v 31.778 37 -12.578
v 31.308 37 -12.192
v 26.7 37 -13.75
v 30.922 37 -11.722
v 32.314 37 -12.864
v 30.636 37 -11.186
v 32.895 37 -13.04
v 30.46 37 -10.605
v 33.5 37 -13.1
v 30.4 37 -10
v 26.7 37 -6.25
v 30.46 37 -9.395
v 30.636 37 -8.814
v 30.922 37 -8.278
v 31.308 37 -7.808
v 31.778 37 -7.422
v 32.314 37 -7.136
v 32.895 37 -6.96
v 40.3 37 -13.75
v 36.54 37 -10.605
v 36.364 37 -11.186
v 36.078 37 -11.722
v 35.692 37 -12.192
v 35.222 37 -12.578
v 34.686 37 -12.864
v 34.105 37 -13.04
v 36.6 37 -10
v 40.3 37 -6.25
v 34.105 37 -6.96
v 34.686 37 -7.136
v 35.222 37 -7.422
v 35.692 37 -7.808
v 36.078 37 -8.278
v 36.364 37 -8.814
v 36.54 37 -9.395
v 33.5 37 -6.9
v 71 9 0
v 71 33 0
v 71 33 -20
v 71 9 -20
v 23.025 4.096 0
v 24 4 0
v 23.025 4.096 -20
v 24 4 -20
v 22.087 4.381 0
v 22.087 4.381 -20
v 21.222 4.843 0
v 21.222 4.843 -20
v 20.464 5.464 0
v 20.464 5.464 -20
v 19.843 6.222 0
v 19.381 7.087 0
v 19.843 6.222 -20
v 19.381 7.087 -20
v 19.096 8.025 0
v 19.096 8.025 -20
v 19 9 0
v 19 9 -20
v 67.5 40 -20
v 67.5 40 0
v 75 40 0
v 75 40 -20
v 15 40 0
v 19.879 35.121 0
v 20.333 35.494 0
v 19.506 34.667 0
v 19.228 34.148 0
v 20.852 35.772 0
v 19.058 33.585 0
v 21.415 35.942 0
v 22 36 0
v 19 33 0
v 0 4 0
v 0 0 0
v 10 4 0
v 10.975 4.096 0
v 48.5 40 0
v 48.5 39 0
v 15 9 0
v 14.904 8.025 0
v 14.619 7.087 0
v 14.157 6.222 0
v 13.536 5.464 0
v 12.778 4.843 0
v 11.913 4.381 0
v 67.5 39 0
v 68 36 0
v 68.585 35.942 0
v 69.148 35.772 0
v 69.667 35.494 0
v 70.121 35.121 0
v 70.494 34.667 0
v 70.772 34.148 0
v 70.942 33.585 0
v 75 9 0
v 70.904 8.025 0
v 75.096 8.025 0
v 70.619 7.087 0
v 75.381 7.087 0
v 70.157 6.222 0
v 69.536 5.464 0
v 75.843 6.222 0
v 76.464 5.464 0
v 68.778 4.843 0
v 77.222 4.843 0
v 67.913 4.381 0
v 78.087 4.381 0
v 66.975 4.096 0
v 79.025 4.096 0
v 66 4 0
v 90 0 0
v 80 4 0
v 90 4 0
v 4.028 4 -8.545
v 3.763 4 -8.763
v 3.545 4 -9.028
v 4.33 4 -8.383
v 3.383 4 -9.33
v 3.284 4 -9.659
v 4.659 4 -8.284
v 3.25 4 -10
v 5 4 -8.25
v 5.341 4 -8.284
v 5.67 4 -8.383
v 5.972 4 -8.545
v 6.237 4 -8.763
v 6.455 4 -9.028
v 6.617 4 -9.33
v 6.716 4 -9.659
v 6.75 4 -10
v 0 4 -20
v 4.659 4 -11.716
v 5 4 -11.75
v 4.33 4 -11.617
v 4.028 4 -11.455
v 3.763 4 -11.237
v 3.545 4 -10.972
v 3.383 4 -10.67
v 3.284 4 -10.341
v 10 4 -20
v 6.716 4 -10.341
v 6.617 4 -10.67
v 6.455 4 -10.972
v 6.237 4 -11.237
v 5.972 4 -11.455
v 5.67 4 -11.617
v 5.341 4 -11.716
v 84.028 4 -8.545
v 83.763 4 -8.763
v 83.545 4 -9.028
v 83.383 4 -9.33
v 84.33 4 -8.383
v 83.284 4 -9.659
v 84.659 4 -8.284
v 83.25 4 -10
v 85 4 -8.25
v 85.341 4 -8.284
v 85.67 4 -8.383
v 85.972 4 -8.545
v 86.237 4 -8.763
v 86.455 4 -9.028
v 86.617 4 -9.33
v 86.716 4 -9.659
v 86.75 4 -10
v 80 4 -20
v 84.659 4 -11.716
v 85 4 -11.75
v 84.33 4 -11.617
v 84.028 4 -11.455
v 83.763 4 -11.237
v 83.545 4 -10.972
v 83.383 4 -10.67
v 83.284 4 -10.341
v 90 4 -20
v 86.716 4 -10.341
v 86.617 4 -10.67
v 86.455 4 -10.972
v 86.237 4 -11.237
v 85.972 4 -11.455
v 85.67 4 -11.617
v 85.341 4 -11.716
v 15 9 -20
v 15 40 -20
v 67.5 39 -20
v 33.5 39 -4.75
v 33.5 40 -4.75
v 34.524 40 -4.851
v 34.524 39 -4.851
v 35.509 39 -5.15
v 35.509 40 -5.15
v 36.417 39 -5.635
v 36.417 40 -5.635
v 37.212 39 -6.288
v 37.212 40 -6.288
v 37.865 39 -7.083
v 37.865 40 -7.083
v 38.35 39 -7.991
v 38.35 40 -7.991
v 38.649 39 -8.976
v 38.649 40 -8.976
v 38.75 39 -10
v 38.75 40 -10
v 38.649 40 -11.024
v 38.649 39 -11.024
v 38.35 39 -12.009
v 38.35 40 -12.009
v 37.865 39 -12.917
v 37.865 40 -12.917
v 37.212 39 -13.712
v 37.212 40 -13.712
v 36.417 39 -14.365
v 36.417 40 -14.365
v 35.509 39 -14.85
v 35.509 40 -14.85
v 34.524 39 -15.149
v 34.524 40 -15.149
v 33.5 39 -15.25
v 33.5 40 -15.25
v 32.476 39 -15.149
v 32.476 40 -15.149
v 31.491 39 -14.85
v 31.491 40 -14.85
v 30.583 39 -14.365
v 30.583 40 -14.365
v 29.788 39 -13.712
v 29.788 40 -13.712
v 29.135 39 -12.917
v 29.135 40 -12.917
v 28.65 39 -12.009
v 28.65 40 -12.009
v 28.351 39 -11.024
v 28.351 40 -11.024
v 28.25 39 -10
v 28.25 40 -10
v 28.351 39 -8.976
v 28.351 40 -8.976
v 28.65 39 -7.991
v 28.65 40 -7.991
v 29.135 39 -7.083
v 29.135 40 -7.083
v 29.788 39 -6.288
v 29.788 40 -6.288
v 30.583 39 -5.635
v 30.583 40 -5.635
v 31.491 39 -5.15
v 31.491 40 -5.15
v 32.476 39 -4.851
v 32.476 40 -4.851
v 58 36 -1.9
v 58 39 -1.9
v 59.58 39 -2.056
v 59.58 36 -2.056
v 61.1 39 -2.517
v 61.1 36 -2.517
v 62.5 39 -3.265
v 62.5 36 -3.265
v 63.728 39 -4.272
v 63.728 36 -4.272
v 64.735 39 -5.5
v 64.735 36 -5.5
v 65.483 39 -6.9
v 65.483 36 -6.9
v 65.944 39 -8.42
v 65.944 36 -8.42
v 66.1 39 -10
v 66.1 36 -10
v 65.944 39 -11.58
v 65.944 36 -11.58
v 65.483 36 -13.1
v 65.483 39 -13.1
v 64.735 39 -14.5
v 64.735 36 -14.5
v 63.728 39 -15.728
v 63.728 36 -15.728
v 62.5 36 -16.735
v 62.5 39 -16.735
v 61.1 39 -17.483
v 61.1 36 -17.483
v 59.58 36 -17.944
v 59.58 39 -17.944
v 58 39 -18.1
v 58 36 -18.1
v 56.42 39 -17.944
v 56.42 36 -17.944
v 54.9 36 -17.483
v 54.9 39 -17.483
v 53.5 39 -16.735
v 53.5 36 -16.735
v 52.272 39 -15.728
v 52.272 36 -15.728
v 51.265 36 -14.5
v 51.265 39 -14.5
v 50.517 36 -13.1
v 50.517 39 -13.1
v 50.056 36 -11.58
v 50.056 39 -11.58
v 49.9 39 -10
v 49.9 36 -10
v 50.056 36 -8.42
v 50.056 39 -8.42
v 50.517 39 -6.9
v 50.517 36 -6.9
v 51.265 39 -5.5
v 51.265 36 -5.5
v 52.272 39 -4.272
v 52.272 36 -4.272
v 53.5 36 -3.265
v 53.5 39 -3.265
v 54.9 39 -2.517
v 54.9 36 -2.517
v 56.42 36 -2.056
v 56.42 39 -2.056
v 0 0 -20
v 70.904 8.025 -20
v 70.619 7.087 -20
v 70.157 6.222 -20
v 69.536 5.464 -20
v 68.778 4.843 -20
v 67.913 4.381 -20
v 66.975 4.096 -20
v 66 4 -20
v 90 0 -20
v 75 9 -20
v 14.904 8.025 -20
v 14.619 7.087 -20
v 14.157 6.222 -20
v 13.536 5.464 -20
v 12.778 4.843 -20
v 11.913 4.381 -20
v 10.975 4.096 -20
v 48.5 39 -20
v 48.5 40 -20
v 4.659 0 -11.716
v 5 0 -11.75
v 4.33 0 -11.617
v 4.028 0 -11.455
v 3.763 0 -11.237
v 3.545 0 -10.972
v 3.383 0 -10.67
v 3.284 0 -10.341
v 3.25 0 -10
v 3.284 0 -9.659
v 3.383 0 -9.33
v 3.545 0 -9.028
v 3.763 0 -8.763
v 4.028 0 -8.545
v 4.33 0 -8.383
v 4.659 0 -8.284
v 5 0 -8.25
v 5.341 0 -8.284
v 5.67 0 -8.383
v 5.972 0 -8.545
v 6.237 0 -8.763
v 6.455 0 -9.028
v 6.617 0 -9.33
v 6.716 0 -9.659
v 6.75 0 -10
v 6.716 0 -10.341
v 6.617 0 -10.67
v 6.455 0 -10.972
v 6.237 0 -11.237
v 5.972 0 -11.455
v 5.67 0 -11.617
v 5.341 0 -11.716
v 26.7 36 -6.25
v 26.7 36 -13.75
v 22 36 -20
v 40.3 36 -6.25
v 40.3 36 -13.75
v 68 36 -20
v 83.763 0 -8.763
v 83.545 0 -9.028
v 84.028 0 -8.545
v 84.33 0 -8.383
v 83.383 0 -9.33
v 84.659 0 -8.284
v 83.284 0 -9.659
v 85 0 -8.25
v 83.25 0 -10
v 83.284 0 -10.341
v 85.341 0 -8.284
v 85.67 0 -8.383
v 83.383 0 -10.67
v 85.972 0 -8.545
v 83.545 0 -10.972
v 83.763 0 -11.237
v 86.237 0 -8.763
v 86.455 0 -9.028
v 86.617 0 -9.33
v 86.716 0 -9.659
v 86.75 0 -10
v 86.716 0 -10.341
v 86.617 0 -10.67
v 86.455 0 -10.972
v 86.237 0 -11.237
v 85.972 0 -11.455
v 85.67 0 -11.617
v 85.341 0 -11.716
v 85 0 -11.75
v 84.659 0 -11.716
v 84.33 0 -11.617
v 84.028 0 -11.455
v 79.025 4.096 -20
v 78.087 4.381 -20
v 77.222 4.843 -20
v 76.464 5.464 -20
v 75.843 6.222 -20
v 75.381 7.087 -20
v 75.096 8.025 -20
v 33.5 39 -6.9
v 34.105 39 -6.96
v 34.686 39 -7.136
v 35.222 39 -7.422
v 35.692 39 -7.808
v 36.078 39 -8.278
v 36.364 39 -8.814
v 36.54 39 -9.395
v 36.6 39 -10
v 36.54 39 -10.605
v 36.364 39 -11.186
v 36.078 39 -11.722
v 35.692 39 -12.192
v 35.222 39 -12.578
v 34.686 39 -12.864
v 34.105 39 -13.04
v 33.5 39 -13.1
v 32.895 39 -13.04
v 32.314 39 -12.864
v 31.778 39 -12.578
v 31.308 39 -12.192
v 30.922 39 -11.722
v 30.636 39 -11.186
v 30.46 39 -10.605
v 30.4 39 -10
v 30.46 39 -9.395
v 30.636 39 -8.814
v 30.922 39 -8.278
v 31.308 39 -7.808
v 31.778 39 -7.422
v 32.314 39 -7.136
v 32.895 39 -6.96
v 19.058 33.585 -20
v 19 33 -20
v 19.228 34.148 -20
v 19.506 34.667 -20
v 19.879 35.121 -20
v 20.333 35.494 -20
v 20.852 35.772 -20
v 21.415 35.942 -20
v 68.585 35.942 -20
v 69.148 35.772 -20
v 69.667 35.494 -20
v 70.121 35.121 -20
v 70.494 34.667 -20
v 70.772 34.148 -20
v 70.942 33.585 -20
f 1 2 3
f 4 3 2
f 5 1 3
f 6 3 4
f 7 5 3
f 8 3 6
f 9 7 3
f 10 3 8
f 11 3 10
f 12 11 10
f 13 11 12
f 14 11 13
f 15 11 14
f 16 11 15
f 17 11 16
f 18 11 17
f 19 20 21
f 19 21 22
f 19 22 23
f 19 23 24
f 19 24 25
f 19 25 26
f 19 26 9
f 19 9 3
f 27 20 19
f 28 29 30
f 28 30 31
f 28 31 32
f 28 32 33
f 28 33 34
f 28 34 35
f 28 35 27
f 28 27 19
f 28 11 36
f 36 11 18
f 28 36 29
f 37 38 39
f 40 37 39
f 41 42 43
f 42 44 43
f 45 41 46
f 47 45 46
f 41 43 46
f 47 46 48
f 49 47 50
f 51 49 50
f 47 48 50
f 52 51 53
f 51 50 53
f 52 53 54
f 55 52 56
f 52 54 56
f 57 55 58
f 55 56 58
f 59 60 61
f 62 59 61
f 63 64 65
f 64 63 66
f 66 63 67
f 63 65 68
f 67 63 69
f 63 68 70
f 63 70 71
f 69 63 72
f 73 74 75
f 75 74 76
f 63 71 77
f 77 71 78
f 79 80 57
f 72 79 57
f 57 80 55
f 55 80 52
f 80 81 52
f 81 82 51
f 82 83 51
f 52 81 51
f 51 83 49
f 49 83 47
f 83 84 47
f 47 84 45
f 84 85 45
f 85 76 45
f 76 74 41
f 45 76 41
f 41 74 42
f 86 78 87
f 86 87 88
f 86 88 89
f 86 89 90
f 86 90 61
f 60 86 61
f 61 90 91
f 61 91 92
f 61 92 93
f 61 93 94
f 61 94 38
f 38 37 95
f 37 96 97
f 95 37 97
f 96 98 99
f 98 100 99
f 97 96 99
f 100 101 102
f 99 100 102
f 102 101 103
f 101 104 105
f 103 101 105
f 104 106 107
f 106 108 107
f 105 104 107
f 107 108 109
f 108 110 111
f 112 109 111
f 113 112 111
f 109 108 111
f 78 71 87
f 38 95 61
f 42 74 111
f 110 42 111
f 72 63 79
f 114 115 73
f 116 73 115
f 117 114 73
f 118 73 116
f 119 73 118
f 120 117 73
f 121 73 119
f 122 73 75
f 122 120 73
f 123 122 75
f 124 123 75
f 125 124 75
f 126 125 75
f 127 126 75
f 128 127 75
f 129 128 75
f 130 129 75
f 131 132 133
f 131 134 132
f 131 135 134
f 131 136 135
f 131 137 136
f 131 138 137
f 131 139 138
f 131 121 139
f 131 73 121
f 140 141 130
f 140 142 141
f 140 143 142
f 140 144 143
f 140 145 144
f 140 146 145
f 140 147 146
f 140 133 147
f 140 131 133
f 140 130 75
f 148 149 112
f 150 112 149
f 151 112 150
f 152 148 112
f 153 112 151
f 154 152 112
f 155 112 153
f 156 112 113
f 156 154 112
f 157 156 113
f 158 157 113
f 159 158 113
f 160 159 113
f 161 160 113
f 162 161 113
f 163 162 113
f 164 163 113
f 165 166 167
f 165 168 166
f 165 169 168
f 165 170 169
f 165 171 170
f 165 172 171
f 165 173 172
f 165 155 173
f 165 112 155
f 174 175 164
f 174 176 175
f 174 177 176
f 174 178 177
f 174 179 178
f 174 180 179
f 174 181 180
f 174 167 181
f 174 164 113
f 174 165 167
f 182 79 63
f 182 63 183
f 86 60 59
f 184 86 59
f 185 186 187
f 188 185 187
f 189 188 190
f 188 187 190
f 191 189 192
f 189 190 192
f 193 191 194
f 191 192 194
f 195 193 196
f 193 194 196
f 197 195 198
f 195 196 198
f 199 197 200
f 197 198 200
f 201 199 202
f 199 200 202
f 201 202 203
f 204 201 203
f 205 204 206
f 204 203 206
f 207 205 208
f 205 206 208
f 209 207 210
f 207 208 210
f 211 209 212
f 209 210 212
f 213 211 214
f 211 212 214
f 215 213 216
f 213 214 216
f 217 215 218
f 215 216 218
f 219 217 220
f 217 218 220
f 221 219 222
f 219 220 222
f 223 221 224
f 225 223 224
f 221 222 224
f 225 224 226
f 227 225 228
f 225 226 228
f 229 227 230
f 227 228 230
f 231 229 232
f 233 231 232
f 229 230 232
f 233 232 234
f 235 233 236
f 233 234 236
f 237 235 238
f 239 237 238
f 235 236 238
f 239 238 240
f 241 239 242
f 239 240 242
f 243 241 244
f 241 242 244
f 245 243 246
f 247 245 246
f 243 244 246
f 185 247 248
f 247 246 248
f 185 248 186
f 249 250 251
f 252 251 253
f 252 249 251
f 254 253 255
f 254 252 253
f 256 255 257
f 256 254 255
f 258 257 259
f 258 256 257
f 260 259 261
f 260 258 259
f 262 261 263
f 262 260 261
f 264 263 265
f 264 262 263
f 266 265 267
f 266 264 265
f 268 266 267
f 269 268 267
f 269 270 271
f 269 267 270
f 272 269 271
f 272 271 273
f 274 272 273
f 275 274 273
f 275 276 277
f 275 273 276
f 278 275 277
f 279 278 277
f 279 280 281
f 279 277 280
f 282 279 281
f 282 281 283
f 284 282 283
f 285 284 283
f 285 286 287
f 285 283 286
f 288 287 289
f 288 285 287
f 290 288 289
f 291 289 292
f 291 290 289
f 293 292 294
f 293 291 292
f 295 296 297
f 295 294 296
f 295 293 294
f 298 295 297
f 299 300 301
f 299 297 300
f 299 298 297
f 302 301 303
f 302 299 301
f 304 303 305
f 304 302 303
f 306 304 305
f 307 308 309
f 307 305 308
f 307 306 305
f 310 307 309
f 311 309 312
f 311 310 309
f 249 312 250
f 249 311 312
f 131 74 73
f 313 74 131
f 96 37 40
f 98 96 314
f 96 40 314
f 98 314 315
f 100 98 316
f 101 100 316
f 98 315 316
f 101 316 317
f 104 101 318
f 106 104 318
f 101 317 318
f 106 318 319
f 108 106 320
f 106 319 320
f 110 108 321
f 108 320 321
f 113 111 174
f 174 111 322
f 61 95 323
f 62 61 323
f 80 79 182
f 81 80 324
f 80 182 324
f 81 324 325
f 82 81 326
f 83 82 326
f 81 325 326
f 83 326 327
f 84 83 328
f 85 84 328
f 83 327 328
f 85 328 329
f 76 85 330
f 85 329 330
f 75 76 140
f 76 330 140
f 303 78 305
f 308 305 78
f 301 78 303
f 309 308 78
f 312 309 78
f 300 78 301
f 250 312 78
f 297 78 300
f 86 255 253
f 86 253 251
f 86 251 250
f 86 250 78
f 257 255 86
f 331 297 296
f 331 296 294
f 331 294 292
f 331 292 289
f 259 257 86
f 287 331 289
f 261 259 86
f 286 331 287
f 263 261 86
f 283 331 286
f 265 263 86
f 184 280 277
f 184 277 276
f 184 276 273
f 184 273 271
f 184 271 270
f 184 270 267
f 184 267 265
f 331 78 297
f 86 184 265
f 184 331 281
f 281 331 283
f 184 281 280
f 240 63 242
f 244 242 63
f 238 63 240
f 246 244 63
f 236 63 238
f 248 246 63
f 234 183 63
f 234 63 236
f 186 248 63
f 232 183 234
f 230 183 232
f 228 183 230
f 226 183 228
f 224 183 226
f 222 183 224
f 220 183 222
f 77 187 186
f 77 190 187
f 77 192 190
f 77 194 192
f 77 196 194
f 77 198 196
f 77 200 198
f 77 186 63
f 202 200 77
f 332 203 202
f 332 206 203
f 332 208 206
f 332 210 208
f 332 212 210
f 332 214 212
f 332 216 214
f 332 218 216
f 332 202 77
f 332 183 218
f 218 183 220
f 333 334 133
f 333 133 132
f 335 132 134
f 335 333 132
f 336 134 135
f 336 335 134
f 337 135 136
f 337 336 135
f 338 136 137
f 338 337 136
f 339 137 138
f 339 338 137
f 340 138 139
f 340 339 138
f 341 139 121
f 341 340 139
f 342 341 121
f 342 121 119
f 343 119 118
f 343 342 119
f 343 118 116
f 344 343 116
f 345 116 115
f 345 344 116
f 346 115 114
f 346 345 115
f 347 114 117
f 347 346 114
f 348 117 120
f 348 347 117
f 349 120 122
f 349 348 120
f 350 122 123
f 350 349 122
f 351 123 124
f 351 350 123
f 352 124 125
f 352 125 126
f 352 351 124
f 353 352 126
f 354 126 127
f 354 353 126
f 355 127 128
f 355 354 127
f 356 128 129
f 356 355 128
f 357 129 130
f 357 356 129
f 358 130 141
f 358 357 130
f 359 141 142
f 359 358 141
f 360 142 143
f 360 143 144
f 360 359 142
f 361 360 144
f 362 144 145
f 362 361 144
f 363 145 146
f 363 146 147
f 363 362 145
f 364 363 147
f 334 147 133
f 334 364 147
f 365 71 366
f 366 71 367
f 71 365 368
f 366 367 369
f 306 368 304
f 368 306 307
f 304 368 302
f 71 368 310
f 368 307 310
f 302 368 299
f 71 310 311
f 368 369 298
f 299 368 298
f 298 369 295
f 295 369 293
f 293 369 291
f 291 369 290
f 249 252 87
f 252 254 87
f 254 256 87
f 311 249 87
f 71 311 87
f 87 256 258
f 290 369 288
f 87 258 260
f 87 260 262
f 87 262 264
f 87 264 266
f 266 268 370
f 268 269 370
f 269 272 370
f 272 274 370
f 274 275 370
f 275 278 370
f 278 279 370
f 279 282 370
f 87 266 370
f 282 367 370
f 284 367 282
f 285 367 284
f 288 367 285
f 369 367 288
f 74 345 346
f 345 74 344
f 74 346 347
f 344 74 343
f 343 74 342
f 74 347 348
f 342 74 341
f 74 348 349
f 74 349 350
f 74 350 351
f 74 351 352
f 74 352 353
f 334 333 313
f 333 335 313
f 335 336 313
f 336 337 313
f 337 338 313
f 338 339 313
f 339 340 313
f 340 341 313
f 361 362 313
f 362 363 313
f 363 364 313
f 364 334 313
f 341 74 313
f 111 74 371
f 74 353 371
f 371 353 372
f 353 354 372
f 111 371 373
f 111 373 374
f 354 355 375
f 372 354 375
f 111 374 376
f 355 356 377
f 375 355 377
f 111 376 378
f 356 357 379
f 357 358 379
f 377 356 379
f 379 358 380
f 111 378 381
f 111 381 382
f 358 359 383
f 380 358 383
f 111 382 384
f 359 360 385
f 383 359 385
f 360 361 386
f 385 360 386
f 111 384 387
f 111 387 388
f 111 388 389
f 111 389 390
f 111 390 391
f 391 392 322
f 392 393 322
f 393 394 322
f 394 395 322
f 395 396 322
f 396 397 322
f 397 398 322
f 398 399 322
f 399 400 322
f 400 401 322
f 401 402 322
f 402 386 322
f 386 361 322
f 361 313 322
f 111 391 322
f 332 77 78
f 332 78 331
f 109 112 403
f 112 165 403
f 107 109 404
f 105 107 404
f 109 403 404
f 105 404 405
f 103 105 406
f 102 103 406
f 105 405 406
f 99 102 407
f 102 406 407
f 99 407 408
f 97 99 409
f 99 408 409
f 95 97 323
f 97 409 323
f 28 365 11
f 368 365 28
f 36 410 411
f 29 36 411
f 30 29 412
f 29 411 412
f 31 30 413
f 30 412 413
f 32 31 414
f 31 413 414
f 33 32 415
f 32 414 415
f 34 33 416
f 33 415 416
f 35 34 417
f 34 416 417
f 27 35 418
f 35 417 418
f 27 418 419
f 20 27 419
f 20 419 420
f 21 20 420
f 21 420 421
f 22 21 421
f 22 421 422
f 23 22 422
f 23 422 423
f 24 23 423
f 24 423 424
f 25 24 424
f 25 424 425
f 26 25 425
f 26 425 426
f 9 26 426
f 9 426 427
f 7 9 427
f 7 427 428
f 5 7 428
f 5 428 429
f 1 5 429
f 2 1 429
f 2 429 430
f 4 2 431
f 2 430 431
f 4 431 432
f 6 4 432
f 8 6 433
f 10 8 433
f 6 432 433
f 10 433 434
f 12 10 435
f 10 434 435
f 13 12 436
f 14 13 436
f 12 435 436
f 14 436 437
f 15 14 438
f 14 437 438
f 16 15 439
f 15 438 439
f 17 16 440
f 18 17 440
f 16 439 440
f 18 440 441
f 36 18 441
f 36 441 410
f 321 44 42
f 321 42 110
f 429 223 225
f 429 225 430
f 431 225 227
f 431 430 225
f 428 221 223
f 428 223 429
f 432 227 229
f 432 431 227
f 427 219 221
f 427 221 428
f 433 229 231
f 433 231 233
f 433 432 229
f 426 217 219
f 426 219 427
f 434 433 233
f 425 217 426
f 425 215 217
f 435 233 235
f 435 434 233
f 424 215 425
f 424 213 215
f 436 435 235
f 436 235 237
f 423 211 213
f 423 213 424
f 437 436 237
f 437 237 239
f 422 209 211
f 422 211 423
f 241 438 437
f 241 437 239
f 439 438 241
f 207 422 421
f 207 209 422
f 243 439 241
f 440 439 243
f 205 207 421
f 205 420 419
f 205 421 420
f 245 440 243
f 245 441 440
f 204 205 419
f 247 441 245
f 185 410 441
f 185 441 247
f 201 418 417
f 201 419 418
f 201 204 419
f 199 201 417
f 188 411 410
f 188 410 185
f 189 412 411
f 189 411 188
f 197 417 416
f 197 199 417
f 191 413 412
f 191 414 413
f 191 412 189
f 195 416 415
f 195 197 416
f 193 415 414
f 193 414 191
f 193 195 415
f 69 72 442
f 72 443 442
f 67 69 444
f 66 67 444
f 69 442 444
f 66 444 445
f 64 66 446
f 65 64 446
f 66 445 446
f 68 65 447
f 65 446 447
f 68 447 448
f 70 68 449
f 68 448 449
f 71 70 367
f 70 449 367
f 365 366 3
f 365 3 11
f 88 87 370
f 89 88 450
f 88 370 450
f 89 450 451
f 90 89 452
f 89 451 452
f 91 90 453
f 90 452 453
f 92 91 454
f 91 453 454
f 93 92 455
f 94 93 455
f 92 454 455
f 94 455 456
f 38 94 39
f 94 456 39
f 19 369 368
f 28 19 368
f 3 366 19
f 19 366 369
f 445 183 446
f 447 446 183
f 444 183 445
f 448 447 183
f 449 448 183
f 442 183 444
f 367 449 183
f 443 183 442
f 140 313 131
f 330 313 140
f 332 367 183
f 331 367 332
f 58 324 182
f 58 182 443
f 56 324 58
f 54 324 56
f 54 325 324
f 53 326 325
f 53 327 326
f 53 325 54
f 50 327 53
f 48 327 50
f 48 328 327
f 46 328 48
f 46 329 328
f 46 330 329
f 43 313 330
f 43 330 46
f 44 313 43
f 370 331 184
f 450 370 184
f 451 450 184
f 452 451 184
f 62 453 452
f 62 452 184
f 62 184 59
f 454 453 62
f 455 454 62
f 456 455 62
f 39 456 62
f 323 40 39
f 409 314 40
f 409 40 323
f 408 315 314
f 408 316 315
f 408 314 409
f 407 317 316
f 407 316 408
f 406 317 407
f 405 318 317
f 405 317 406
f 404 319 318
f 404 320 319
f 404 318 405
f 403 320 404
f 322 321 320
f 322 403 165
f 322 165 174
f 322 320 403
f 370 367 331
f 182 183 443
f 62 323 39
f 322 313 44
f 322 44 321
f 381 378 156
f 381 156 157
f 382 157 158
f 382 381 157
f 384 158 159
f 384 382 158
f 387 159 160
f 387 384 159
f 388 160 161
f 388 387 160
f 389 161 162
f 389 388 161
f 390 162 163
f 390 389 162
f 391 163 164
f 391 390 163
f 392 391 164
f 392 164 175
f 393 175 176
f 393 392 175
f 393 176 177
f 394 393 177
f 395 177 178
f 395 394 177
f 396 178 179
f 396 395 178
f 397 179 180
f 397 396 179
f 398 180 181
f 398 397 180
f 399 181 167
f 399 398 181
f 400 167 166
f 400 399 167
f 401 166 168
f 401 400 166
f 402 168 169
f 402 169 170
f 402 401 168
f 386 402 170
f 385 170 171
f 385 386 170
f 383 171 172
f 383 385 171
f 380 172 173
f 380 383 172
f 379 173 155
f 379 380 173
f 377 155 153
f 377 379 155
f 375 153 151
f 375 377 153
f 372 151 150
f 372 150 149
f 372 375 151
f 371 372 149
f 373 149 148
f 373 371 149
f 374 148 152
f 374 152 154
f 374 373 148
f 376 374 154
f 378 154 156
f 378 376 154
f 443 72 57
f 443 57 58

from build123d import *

# Parameters (mm, degrees)
SKETCH_1_W          = 90
SKETCH_1_H          = 20
SKETCH_1_R          = 1.75
EXTRUDE_1_DEPTH     = 4
SKETCH_2_W          = 4
SKETCH_2_H          = 20
EXTRUDE_2_DEPTH     = 32
SKETCH_3_W          = 60
SKETCH_3_H          = 20
SKETCH_3_R          = 8.1
EXTRUDE_3_DEPTH     = 4
FILLET_1_R          = 5
FILLET_2_R          = 3
SKETCH_4_W          = 19
SKETCH_4_H          = 20
CUT_EXTRUDE_1_DEPTH = 1
SKETCH_5_R          = 3.1
CUT_EXTRUDE_2_DEPTH = 10
SKETCH_6_W          = 13.6
SKETCH_6_H          = 7.5
CUT_EXTRUDE_3_DEPTH = 1
SKETCH_7_R          = 5.25
CUT_EXTRUDE_4_DEPTH = 1


with BuildPart() as part:
    # 草图1 → 凸台-拉伸1 (new body)
    with BuildSketch(Plane(origin=(0, 0, 0), x_dir=(1, 0, 0), z_dir=(0, 1, 0))):
        with Locations((45, 10)):
            Rectangle(SKETCH_1_W, SKETCH_1_H)
        with Locations(Location((85, 10, 0), (0, 0, 270))):
            Circle(SKETCH_1_R, mode=Mode.SUBTRACT)
        with Locations(Location((5, 10, 0), (0, 0, 90))):
            Circle(SKETCH_1_R, mode=Mode.SUBTRACT)
    extrude(amount=EXTRUDE_1_DEPTH)

    # 草图2 → 凸台-拉伸2 (add)
    with BuildSketch(Plane(origin=(0, 4, 0), x_dir=(1, 0, 0), z_dir=(0, 1, 0))):
        with Locations((17, 10)):
            Rectangle(SKETCH_2_W, SKETCH_2_H)
        with Locations((73, 10)):
            Rectangle(SKETCH_2_W, SKETCH_2_H)
    extrude(amount=EXTRUDE_2_DEPTH)

    # 草图3 → 凸台-拉伸3 (add)
    with BuildSketch(Plane(origin=(0, 36, 0), x_dir=(1, 0, 0), z_dir=(0, 1, 0))):
        with Locations((45, 10)):
            Rectangle(SKETCH_3_W, SKETCH_3_H)
        with Locations(Location((58, 10, 0), (0, 0, 270))):
            Circle(SKETCH_3_R, mode=Mode.SUBTRACT)
    extrude(amount=EXTRUDE_3_DEPTH)

    # 圆角1
    fillet_1_edges = [part.edges().sort_by_distance(p)[0] for p in [
        (15, 4, -10),
        (19, 4, -10),
        (75, 4, -10),
        (71, 4, -10),
    ]]
    fillet(fillet_1_edges, radius=FILLET_1_R)

    # 圆角2
    fillet_2_edges = [part.edges().sort_by_distance(p)[0] for p in [
        (19, 36, -10),
        (71, 36, -10),
    ]]
    fillet(fillet_2_edges, radius=FILLET_2_R)

    # 草图4 → 切除-拉伸1 (cut)
    with BuildSketch(Plane(origin=(0, 40, 0), x_dir=(1, 0, 0), z_dir=(0, 1, 0))):
        with Locations((58, 10)):
            Rectangle(SKETCH_4_W, SKETCH_4_H)
    extrude(amount=-CUT_EXTRUDE_1_DEPTH, mode=Mode.SUBTRACT)

    # 草图5 → 切除-拉伸2 (cut)
    with BuildSketch(Plane(origin=(0, 40, 0), x_dir=(1, 0, 0), z_dir=(0, 1, 0))):
        with Locations(Location((33.5, 10, 0), (0, 0, 270))):
            Circle(SKETCH_5_R)
    extrude(amount=-CUT_EXTRUDE_2_DEPTH, mode=Mode.SUBTRACT)

    # 草图6 → 切除-拉伸3 (cut)
    with BuildSketch(Plane.XZ.offset(-36)):
        with Locations((33.5, -10)):
            Rectangle(SKETCH_6_W, SKETCH_6_H)
    extrude(amount=-CUT_EXTRUDE_3_DEPTH, mode=Mode.SUBTRACT)

    # 草图7 → 切除-拉伸4 (cut)
    with BuildSketch(Plane(origin=(0, 40, 0), x_dir=(1, 0, 0), z_dir=(0, 1, 0))):
        with Locations(Location((33.5, 10, 0), (0, 0, 270))):
            Circle(SKETCH_7_R)
    extrude(amount=-CUT_EXTRUDE_4_DEPTH, mode=Mode.SUBTRACT)


solid = part.part
